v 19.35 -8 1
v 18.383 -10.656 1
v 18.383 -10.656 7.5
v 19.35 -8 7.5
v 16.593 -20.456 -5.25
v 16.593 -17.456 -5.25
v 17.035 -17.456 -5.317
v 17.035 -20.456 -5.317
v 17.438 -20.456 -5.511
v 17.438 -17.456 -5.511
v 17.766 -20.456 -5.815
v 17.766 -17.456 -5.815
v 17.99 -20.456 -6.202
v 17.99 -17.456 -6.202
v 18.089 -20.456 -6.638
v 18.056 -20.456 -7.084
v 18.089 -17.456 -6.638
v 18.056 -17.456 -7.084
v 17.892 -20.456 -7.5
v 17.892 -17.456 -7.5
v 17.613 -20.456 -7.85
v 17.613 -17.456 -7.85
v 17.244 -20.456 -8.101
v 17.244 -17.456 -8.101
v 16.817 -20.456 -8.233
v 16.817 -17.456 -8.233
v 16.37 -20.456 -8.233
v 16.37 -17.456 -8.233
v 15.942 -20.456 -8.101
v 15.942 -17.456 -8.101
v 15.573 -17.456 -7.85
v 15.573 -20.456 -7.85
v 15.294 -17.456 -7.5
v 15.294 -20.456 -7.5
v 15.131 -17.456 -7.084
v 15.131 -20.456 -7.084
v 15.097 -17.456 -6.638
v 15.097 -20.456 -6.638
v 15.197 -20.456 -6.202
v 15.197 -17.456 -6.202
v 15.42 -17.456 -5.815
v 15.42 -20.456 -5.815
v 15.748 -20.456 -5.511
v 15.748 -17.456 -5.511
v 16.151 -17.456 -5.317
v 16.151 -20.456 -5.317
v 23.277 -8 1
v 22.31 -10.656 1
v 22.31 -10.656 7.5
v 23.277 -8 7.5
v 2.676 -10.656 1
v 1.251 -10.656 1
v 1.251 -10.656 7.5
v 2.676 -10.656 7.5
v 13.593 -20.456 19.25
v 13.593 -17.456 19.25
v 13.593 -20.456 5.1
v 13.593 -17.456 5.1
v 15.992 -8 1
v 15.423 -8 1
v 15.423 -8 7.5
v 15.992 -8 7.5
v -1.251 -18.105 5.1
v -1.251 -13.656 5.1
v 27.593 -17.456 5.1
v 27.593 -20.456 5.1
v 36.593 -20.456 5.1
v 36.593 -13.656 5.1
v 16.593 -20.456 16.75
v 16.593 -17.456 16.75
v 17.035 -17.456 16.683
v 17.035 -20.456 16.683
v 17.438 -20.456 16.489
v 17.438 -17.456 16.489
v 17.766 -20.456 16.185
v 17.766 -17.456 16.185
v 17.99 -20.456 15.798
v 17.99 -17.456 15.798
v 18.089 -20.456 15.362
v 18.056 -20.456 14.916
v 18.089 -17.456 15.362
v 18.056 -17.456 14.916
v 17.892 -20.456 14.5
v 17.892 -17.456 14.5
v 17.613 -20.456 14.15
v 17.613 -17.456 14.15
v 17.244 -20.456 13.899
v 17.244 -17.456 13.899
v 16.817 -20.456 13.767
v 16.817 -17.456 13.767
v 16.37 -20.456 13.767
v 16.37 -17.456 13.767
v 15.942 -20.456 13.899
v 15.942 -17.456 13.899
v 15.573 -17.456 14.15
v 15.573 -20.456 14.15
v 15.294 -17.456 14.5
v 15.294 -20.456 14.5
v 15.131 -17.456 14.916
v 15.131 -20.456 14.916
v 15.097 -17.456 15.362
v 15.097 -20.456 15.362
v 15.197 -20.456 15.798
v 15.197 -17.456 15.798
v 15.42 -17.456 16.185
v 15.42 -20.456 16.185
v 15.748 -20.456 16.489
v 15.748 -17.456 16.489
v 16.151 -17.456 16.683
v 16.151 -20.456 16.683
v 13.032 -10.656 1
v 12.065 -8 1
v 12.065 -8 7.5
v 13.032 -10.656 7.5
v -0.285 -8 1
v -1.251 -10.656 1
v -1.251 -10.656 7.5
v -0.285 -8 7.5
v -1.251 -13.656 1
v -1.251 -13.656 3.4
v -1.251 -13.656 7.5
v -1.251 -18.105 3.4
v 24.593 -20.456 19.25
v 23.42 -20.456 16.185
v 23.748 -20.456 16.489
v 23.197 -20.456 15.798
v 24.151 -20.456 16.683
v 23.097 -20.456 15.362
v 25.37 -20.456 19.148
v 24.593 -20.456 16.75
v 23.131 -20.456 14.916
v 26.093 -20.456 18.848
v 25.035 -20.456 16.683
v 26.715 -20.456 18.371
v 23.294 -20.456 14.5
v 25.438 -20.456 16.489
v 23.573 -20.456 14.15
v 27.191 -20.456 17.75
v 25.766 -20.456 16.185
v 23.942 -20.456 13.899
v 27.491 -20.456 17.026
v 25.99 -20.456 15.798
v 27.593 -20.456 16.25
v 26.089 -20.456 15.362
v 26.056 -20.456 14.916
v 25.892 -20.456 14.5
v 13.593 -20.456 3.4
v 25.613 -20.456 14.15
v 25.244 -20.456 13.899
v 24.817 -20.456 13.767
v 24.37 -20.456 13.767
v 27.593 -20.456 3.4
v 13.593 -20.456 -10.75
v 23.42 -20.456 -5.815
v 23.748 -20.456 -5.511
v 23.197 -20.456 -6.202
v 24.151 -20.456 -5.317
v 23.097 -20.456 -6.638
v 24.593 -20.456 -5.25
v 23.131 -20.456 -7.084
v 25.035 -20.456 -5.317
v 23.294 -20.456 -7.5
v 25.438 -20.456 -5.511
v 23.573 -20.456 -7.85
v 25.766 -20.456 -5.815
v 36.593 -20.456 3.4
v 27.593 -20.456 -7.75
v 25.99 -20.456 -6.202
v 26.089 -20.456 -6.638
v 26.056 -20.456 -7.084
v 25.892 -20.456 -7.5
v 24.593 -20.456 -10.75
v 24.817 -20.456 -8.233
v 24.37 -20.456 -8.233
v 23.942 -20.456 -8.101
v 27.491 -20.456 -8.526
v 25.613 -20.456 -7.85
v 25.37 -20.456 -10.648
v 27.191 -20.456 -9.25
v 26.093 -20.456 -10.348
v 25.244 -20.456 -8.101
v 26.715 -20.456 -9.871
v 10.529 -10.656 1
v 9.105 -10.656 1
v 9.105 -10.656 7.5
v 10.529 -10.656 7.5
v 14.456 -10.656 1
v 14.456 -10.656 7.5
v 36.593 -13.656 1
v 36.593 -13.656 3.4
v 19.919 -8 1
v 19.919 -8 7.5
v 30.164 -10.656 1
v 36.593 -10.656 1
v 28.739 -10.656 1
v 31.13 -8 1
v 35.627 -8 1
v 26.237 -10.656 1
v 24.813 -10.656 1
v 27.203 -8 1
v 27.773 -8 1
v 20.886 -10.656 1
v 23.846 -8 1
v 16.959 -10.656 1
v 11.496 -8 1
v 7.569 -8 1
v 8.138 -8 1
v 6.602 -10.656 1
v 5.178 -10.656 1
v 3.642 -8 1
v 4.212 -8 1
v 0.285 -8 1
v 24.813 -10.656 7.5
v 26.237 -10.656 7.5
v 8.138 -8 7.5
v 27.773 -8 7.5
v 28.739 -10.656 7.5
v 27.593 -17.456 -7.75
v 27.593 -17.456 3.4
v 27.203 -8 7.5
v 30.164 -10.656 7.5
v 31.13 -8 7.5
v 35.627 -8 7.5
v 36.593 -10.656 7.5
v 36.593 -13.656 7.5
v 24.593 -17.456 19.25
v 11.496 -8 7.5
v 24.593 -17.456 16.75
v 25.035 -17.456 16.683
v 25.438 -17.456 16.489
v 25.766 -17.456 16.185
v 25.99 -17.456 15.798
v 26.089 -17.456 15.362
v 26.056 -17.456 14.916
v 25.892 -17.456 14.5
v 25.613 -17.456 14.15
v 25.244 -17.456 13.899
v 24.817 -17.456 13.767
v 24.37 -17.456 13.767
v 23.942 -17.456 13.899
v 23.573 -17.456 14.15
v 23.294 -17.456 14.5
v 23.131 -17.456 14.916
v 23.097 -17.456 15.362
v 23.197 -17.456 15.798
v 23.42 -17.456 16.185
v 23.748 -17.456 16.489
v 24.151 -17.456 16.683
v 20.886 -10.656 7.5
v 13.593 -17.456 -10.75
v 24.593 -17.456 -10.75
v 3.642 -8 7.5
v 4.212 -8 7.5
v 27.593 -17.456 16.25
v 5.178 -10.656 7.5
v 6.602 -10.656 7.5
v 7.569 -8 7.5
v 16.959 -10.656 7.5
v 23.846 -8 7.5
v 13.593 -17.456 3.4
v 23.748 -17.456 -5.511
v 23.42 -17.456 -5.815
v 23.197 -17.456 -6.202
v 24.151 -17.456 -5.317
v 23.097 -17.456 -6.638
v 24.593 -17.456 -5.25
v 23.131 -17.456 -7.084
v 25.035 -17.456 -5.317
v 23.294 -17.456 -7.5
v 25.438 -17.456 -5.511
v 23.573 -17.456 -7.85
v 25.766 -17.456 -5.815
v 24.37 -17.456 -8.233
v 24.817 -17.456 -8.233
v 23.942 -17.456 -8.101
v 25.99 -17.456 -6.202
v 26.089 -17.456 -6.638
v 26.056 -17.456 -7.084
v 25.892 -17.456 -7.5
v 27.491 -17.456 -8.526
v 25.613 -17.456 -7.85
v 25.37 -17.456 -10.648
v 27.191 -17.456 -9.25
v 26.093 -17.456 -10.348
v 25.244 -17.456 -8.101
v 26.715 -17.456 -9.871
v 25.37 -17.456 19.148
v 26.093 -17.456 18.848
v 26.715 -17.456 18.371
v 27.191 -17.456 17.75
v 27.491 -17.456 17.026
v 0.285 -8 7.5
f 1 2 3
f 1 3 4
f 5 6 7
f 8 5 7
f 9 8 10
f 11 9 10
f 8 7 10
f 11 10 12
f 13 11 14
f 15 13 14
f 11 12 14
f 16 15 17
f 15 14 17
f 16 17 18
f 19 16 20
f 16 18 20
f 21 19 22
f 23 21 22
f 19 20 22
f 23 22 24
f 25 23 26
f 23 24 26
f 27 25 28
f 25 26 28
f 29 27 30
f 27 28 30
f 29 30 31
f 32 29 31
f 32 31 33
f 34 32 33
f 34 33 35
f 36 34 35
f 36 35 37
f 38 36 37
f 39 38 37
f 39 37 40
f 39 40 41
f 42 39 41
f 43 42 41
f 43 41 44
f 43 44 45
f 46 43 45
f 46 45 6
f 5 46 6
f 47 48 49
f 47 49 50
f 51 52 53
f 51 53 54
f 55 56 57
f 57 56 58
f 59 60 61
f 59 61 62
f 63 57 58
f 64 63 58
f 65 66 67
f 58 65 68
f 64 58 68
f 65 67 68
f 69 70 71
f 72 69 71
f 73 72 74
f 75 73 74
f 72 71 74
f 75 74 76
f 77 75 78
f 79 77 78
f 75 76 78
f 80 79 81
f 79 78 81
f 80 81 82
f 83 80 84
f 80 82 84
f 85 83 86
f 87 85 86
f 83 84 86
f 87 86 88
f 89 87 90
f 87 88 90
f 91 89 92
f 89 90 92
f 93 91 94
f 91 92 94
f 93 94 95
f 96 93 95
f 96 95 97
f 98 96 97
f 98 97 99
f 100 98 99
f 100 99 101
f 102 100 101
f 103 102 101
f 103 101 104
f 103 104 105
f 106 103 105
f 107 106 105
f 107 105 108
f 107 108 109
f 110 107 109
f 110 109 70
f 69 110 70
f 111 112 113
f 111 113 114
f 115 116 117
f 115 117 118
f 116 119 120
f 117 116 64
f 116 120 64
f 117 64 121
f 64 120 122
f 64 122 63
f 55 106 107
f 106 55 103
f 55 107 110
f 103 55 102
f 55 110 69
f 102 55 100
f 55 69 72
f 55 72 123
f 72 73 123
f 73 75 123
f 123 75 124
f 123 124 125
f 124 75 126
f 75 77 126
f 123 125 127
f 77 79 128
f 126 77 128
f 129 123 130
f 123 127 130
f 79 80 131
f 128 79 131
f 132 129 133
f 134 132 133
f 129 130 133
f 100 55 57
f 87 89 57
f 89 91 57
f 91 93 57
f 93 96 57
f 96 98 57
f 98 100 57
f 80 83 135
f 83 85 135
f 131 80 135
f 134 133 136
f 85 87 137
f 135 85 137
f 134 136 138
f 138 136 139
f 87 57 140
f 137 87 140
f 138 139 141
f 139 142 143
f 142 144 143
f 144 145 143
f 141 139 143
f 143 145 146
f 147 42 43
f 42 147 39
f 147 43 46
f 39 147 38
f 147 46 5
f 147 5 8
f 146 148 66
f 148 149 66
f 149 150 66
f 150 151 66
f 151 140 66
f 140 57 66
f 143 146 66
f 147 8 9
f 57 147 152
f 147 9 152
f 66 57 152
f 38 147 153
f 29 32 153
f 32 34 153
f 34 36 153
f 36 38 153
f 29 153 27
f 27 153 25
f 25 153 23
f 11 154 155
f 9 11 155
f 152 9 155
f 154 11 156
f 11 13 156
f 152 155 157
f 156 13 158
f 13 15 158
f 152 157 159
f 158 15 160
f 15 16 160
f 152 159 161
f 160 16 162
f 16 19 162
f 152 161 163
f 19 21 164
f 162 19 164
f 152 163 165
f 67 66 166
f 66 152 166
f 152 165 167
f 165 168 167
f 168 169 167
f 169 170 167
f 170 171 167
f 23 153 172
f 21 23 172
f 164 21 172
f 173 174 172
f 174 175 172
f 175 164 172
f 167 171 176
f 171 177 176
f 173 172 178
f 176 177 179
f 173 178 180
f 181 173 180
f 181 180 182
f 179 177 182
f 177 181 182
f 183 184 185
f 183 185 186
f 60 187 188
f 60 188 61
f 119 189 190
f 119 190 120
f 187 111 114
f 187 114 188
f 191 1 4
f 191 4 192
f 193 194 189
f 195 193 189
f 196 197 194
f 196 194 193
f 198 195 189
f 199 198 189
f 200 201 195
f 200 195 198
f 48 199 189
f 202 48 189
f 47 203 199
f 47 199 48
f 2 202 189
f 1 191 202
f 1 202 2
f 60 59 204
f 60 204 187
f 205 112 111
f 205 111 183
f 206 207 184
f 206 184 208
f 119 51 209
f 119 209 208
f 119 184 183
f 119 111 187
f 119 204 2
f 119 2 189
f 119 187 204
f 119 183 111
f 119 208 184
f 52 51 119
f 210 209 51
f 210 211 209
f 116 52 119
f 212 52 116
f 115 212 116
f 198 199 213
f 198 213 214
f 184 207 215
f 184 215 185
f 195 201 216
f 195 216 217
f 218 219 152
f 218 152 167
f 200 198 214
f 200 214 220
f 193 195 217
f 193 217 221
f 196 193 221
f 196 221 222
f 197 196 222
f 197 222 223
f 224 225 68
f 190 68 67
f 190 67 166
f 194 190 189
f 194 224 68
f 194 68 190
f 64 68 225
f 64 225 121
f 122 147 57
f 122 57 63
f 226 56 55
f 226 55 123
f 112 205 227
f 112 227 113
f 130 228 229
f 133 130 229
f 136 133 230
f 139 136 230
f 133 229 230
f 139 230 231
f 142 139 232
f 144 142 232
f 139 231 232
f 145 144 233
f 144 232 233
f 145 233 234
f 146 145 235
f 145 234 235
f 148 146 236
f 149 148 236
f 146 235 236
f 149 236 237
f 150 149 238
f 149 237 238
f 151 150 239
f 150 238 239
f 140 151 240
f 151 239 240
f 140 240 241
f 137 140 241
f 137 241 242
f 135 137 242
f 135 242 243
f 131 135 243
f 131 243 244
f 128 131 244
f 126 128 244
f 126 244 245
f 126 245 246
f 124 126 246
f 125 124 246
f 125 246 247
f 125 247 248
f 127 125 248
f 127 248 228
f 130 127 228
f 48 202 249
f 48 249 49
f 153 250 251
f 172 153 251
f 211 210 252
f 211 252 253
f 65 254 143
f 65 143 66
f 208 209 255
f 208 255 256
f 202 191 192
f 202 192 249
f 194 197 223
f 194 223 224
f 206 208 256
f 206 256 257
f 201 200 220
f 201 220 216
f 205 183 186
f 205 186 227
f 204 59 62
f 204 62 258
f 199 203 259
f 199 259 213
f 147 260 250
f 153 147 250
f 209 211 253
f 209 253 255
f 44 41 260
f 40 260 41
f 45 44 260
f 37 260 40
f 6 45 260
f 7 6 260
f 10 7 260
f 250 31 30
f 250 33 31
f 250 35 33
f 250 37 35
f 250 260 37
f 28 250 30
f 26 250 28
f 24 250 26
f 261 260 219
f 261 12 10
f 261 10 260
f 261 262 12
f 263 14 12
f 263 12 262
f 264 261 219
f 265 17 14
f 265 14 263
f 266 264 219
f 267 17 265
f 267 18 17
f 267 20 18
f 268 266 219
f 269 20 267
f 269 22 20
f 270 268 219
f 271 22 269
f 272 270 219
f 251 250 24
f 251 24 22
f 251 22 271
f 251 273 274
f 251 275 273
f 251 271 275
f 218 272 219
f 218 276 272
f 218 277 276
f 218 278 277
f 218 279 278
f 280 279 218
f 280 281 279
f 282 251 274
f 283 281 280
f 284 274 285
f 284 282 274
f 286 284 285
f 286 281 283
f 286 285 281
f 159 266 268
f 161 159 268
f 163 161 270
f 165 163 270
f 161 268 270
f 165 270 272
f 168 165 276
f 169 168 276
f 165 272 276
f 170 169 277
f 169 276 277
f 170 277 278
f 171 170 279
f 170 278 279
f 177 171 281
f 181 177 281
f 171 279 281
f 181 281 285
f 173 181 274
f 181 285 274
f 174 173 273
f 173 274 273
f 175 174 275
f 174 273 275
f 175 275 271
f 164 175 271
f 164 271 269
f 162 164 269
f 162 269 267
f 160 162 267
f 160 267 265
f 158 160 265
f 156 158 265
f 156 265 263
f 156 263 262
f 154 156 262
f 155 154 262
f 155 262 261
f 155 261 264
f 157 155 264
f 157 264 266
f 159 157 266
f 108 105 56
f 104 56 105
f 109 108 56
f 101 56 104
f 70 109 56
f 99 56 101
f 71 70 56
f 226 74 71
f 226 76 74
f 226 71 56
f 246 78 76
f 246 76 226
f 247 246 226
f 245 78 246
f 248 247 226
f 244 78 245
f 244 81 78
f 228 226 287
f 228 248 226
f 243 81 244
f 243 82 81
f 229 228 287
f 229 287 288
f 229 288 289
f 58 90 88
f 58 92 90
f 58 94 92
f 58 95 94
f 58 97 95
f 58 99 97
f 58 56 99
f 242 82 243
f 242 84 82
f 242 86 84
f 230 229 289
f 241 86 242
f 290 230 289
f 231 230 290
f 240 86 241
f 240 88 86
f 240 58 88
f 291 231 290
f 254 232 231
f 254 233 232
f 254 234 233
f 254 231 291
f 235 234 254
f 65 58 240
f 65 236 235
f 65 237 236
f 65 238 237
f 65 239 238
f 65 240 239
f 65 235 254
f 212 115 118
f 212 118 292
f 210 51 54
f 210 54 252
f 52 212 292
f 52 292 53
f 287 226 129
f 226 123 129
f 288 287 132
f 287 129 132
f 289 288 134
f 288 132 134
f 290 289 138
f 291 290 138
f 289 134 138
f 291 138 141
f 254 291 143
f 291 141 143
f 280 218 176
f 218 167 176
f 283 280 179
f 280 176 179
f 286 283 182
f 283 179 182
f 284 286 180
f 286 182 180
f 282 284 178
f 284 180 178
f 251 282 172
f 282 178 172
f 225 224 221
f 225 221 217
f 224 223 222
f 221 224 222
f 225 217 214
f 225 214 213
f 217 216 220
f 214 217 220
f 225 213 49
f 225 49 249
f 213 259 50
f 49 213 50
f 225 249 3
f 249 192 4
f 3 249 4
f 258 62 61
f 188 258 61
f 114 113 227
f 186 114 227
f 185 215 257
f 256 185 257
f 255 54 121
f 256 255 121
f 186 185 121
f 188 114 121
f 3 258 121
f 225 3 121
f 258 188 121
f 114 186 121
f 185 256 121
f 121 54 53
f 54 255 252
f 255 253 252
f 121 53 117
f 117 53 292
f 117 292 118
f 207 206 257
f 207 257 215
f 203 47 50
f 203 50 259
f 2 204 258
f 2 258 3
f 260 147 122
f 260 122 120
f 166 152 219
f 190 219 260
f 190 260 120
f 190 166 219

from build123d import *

# Parameters (mm, degrees)
ESQUISSE1_R             = 2.5
BOSS_EXTRU_1_DEPTH      = 1
BOSS_EXTRU_2_DEPTH      = 6.5
ESQUISSE3_R             = 14.137419556
ENL_V_MAT_EXTRU_1_DEPTH = 1
ESQUISSE4_W             = 37.844594902
ESQUISSE4_H             = 1.7
BOSS_EXTRU_3_DEPTH      = 3.8
BOSS_EXTRU_4_START      = -17.456
ESQUISSE5_W             = 20
ESQUISSE5_H             = 30
BOSS_EXTRU_4_DEPTH      = 3
BOSS_EXTRU_5_START      = -17.456
ESQUISSE7_W             = 3
ESQUISSE7_H             = 30
BOSS_EXTRU_5_DEPTH      = 3
CHANFREIN1_SIZE         = 3
CHANFREIN1_SIZE_2       = 18.941254544
ESQUISSE6_R             = 1.5
ENL_V_MAT_EXTRU_2_DEPTH = 47.131066324
BOSS_EXTRU_6_START      = 1
BOSS_EXTRU_6_DEPTH      = 6.5
ESQUISSE9_W             = 9
ESQUISSE9_H             = 14.15
ENL_V_MAT_EXTRU_3_DEPTH = 43.415130321
CONG_2_R                = 3


with BuildPart() as part:
    # Esquisse1 → Boss.-Extru.1 (new body)
    with BuildSketch(Plane.XY):
        with BuildLine():
            ThreePointArc((-2.797532396, 7.349311298), (-3.009326841, 7.265157674), (-3.218593728, 7.174901984))
            ThreePointArc((-3.218593728, 7.174901984), (-3.518823735, 7.161602241), (-3.746621491, 7.357620412))
            ThreePointArc((-3.746621491, 7.357620412), (-4.480939546, 8.300763177), (-5.498824516, 8.927382256))
            ThreePointArc((-5.498824516, 8.927382256), (-5.825153893, 8.717958885), (-6.143516706, 8.496612707))
            ThreePointArc((-6.143516706, 8.496612707), (-5.954123878, 7.316412877), (-5.363784935, 6.277066345))
            ThreePointArc((-5.363784935, 6.277066345), (-5.269862186, 5.991595754), (-5.397042596, 5.719308987))
            ThreePointArc((-5.397042596, 5.719308987), (-5.560510951, 5.560510951), (-5.719308987, 5.397042596))
            ThreePointArc((-5.719308987, 5.397042596), (-5.991595754, 5.269862186), (-6.277066345, 5.363784935))
            ThreePointArc((-6.277066345, 5.363784935), (-7.316412877, 5.954123878), (-8.496612707, 6.143516706))
            ThreePointArc((-8.496612707, 6.143516706), (-8.717958885, 5.825153893), (-8.927382256, 5.498824516))
            ThreePointArc((-8.927382256, 5.498824516), (-8.300763177, 4.480939546), (-7.357620412, 3.746621491))
            ThreePointArc((-7.357620412, 3.746621491), (-7.161602241, 3.518823735), (-7.174901984, 3.218593728))
            ThreePointArc((-7.174901984, 3.218593728), (-7.265157674, 3.009326841), (-7.349311298, 2.797532396))
            ThreePointArc((-7.349311298, 2.797532396), (-7.552201634, 2.575833384), (-7.851884749, 2.553361824))
            ThreePointArc((-7.851884749, 2.553361824), (-9.038028671, 2.701023192), (-10.200868635, 2.424356428))
            ThreePointArc((-10.200868635, 2.424356428), (-10.283533665, 2.045522026), (-10.352134785, 1.663890139))
            ThreePointArc((-10.352134785, 1.663890139), (-9.383686529, 0.963283789), (-8.231324879, 0.645787478))
            ThreePointArc((-8.231324879, 0.645787478), (-7.963053276, 0.510342701), (-7.860447586, 0.22787675))
            ThreePointArc((-7.860447586, 0.22787675), (-7.86375, 0), (-7.860447586, -0.22787675))
            ThreePointArc((-7.860447586, -0.22787675), (-7.963053276, -0.510342701), (-8.231324879, -0.645787478))
            ThreePointArc((-8.231324879, -0.645787478), (-9.383686529, -0.963283789), (-10.352134785, -1.663890139))
            ThreePointArc((-10.352134785, -1.663890139), (-10.283533665, -2.045522026), (-10.200868635, -2.424356428))
            ThreePointArc((-10.200868635, -2.424356428), (-9.038028671, -2.701023192), (-7.851884749, -2.553361824))
            ThreePointArc((-7.851884749, -2.553361824), (-7.552201634, -2.575833384), (-7.349311298, -2.797532396))
            ThreePointArc((-7.349311298, -2.797532396), (-7.265157674, -3.009326841), (-7.174901984, -3.218593728))
            ThreePointArc((-7.174901984, -3.218593728), (-7.161602241, -3.518823735), (-7.357620412, -3.746621491))
            ThreePointArc((-7.357620412, -3.746621491), (-8.300763177, -4.480939546), (-8.927382256, -5.498824516))
            ThreePointArc((-8.927382256, -5.498824516), (-8.717958885, -5.825153893), (-8.496612707, -6.143516706))
            ThreePointArc((-8.496612707, -6.143516706), (-7.316412877, -5.954123878), (-6.277066345, -5.363784935))
            ThreePointArc((-6.277066345, -5.363784935), (-5.991595754, -5.269862186), (-5.719308987, -5.397042596))
            ThreePointArc((-5.719308987, -5.397042596), (-5.560510951, -5.560510951), (-5.397042596, -5.719308987))
            ThreePointArc((-5.397042596, -5.719308987), (-5.269862186, -5.991595754), (-5.363784935, -6.277066345))
            ThreePointArc((-5.363784935, -6.277066345), (-5.954123878, -7.316412877), (-6.143516706, -8.496612707))
            ThreePointArc((-6.143516706, -8.496612707), (-5.825153893, -8.717958885), (-5.498824516, -8.927382256))
            ThreePointArc((-5.498824516, -8.927382256), (-4.480939546, -8.300763177), (-3.746621491, -7.357620412))
            ThreePointArc((-3.746621491, -7.357620412), (-3.518823735, -7.161602241), (-3.218593728, -7.174901984))
            ThreePointArc((-3.218593728, -7.174901984), (-3.009326841, -7.265157674), (-2.797532396, -7.349311298))
            ThreePointArc((-2.797532396, -7.349311298), (-2.575833384, -7.552201634), (-2.553361824, -7.851884749))
            ThreePointArc((-2.553361824, -7.851884749), (-2.701023192, -9.038028671), (-2.424356428, -10.200868635))
            ThreePointArc((-2.424356428, -10.200868635), (-2.045522026, -10.283533665), (-1.663890139, -10.352134785))
            ThreePointArc((-1.663890139, -10.352134785), (-0.963283789, -9.383686529), (-0.645787478, -8.231324879))
            ThreePointArc((-0.645787478, -8.231324879), (-0.510342701, -7.963053276), (-0.22787675, -7.860447586))
            ThreePointArc((-0.22787675, -7.860447586), (0, -7.86375), (0.22787675, -7.860447586))
            ThreePointArc((0.22787675, -7.860447586), (0.510342701, -7.963053276), (0.645787478, -8.231324879))
            ThreePointArc((0.645787478, -8.231324879), (0.963283789, -9.383686529), (1.663890139, -10.352134785))
            ThreePointArc((1.663890139, -10.352134785), (2.045522026, -10.283533665), (2.424356428, -10.200868635))
            ThreePointArc((2.424356428, -10.200868635), (2.701023192, -9.038028671), (2.553361824, -7.851884749))
            ThreePointArc((2.553361824, -7.851884749), (2.575833384, -7.552201634), (2.797532396, -7.349311298))
            ThreePointArc((2.797532396, -7.349311298), (3.009326841, -7.265157674), (3.218593728, -7.174901984))
            ThreePointArc((3.218593728, -7.174901984), (3.518823735, -7.161602241), (3.746621491, -7.357620412))
            ThreePointArc((3.746621491, -7.357620412), (4.480939546, -8.300763177), (5.498824516, -8.927382256))
            ThreePointArc((5.498824516, -8.927382256), (5.825153893, -8.717958885), (6.143516706, -8.496612707))
            ThreePointArc((6.143516706, -8.496612707), (5.954123878, -7.316412877), (5.363784935, -6.277066345))
            ThreePointArc((5.363784935, -6.277066345), (5.269862186, -5.991595754), (5.397042596, -5.719308987))
            ThreePointArc((5.397042596, -5.719308987), (5.560510951, -5.560510951), (5.719308987, -5.397042596))
            ThreePointArc((5.719308987, -5.397042596), (5.991595754, -5.269862186), (6.277066345, -5.363784935))
            ThreePointArc((6.277066345, -5.363784935), (7.316412877, -5.954123878), (8.496612707, -6.143516706))
            ThreePointArc((8.496612707, -6.143516706), (8.717958885, -5.825153893), (8.927382256, -5.498824516))
            ThreePointArc((8.927382256, -5.498824516), (8.300763177, -4.480939546), (7.357620412, -3.746621491))
            ThreePointArc((7.357620412, -3.746621491), (7.161602241, -3.518823735), (7.174901984, -3.218593728))
            ThreePointArc((7.174901984, -3.218593728), (7.265157674, -3.009326841), (7.349311298, -2.797532396))
            ThreePointArc((7.349311298, -2.797532396), (7.552201634, -2.575833384), (7.851884749, -2.553361824))
            ThreePointArc((7.851884749, -2.553361824), (9.038028671, -2.701023192), (10.200868635, -2.424356428))
            ThreePointArc((10.200868635, -2.424356428), (10.283533665, -2.045522026), (10.352134785, -1.663890139))
            ThreePointArc((10.352134785, -1.663890139), (9.383686529, -0.963283789), (8.231324879, -0.645787478))
            ThreePointArc((8.231324879, -0.645787478), (7.963053276, -0.510342701), (7.860447586, -0.22787675))
            ThreePointArc((7.860447586, -0.22787675), (7.86375, 0), (7.860447586, 0.22787675))
            ThreePointArc((7.860447586, 0.22787675), (7.963053276, 0.510342701), (8.231324879, 0.645787478))
            ThreePointArc((8.231324879, 0.645787478), (9.383686529, 0.963283789), (10.352134785, 1.663890139))
            ThreePointArc((10.352134785, 1.663890139), (10.283533665, 2.045522026), (10.200868635, 2.424356428))
            ThreePointArc((10.200868635, 2.424356428), (9.038028671, 2.701023192), (7.851884749, 2.553361824))
            ThreePointArc((7.851884749, 2.553361824), (7.552201634, 2.575833384), (7.349311298, 2.797532396))
            ThreePointArc((7.349311298, 2.797532396), (7.265157674, 3.009326841), (7.174901984, 3.218593728))
            ThreePointArc((7.174901984, 3.218593728), (7.161602241, 3.518823735), (7.357620412, 3.746621491))
            ThreePointArc((7.357620412, 3.746621491), (8.300763177, 4.480939546), (8.927382256, 5.498824516))
            ThreePointArc((8.927382256, 5.498824516), (8.717958885, 5.825153893), (8.496612707, 6.143516706))
            ThreePointArc((8.496612707, 6.143516706), (7.316412877, 5.954123878), (6.277066345, 5.363784935))
            ThreePointArc((6.277066345, 5.363784935), (5.991595754, 5.269862186), (5.719308987, 5.397042596))
            ThreePointArc((5.719308987, 5.397042596), (5.560510951, 5.560510951), (5.397042596, 5.719308987))
            ThreePointArc((5.397042596, 5.719308987), (5.269862186, 5.991595754), (5.363784935, 6.277066345))
            ThreePointArc((5.363784935, 6.277066345), (5.954123878, 7.316412877), (6.143516706, 8.496612707))
            ThreePointArc((6.143516706, 8.496612707), (5.825153893, 8.717958885), (5.498824516, 8.927382256))
            ThreePointArc((5.498824516, 8.927382256), (4.480939546, 8.300763177), (3.746621491, 7.357620412))
            ThreePointArc((3.746621491, 7.357620412), (3.518823735, 7.161602241), (3.218593728, 7.174901984))
            ThreePointArc((3.218593728, 7.174901984), (3.009326841, 7.265157674), (2.797532396, 7.349311298))
            ThreePointArc((2.797532396, 7.349311298), (2.575833384, 7.552201634), (2.553361824, 7.851884749))
            ThreePointArc((2.553361824, 7.851884749), (2.701023192, 9.038028671), (2.424356428, 10.200868635))
            ThreePointArc((2.424356428, 10.200868635), (2.045522026, 10.283533665), (1.663890139, 10.352134785))
            ThreePointArc((1.663890139, 10.352134785), (0.963283789, 9.383686529), (0.645787478, 8.231324879))
            ThreePointArc((0.645787478, 8.231324879), (0.510342701, 7.963053276), (0.22787675, 7.860447586))
            ThreePointArc((0.22787675, 7.860447586), (0, 7.86375), (-0.22787675, 7.860447586))
            ThreePointArc((-0.22787675, 7.860447586), (-0.510342701, 7.963053276), (-0.645787478, 8.231324879))
            ThreePointArc((-0.645787478, 8.231324879), (-0.963283789, 9.383686529), (-1.663890139, 10.352134785))
            ThreePointArc((-1.663890139, 10.352134785), (-2.045522026, 10.283533665), (-2.424356428, 10.200868635))
            ThreePointArc((-2.424356428, 10.200868635), (-2.701023192, 9.038028671), (-2.553361824, 7.851884749))
            ThreePointArc((-2.553361824, 7.851884749), (-2.575833384, 7.552201634), (-2.797532396, 7.349311298))
        make_face()
        Circle(ESQUISSE1_R, mode=Mode.SUBTRACT)
    extrude(amount=BOSS_EXTRU_1_DEPTH)

    # Esquisse2 → Boss.-Extru.2 (add)
    with BuildSketch(Plane.XY.offset(1)):
        Polygon((0.284655009, -8), (1.251359951, -10.656), (2.675515049, -10.656), (3.642219991, -8), (4.211530009, -8), (5.178234951, -10.656), (6.602390049, -10.656), (7.569094991, -8), (8.138405009, -8), (9.105109951, -10.656), (10.529265049, -10.656), (11.495969991, -8), (12.065280009, -8), (13.031984951, -10.656), (14.456140049, -10.656), (15.422844991, -8), (15.992155009, -8), (16.958859951, -10.656), (18.383015049, -10.656), (19.349719991, -8), (19.919030009, -8), (20.885734951, -10.656), (22.309890049, -10.656), (23.276594991, -8), (23.845905009, -8), (24.812609951, -10.656), (26.236765049, -10.656), (27.203469991, -8), (27.772780009, -8), (28.739484951, -10.656), (30.163640049, -10.656), (31.130344991, -8), (31.699655009, -8), (32.666359951, -10.656), (34.090515049, -10.656), (35.057219991, -8), (35.626530009, -8), (36.593234951, -10.656), (36.593234951, -13.656), (-1.251359951, -13.656), (-1.251359951, -10.656), (-0.284655009, -8), align=None)
    extrude(amount=BOSS_EXTRU_2_DEPTH)

    # Esquisse3 → Enlèv. mat.-Extru.1 (cut)
    with BuildSketch(Plane(origin=(0, 0, 0), x_dir=(-1, 0, 0), z_dir=(0, 0, -1))):
        Circle(ESQUISSE3_R)
    extrude(amount=-ENL_V_MAT_EXTRU_1_DEPTH, mode=Mode.SUBTRACT)

    # Esquisse4 → Boss.-Extru.3 (add)
    with BuildSketch(Plane.XZ.offset(13.656)):
        with Locations((17.6709375, 4.25)):
            Rectangle(ESQUISSE4_W, ESQUISSE4_H)
    extrude(amount=BOSS_EXTRU_3_DEPTH)

    # Esquisse5 → Boss.-Extru.4 (add)
    with BuildSketch(Plane(origin=(0, 0, 0), x_dir=(1, 0, 0), z_dir=(0, 1, 0)).offset(BOSS_EXTRU_4_START)):
        with Locations((26.593234951, -4.25)):
            Rectangle(ESQUISSE5_W, ESQUISSE5_H)
    extrude(amount=-BOSS_EXTRU_4_DEPTH)

    # Esquisse7 → Boss.-Extru.5 (add)
    with BuildSketch(Plane(origin=(0, 0, 0), x_dir=(1, 0, 0), z_dir=(0, 1, 0)).offset(BOSS_EXTRU_5_START)):
        with Locations((15.093234951, -4.25)):
            Rectangle(ESQUISSE7_W, ESQUISSE7_H)
    extrude(amount=-BOSS_EXTRU_5_DEPTH)

    # Chanfrein1
    # the kernel refuses this chamfer: 18.941254544, 3 mm, written as the material it adds along each edge
    with BuildSketch(Plane(origin=(13.593234951, -17.456, 3.4), x_dir=(0.23333663699196244, -0.9723960169793381, 0), z_dir=(0, 0, 1))) as chanfrein1_piece_1_section:
        Polygon((CHANFREIN1_SIZE * 0.972396016979, -CHANFREIN1_SIZE * 0.233336636992), (-CHANFREIN1_SIZE_2 * 0.233336636992, -CHANFREIN1_SIZE_2 * 0.972396016981), (0, 0), align=None)
    chanfrein1_piece_1 = extrude(amount=1.7, mode=Mode.PRIVATE)
    chanfrein1_piece_1 = split(chanfrein1_piece_1, bisect_by=Plane(origin=(-1.251359951, -18.494459875, 4.25), z_dir=(1, 0, 0)), keep=Keep.TOP, mode=Mode.PRIVATE)
    add(chanfrein1_piece_1)

    # Esquisse6 → Enlèv. mat.-Extru.2 (cut, through all)
    with BuildSketch(Plane(origin=(0, 0, 0), x_dir=(1, 0, 0), z_dir=(0, 1, 0))):
        with Locations(Location((16.593234951, 6.75, 0), (0, 0, 270))):
            Circle(ESQUISSE6_R)
        with Locations(Location((24.593234951, 6.75, 0), (0, 0, 270))):
            Circle(ESQUISSE6_R)
        with Locations(Location((24.593234951, -15.25, 0), (0, 0, 270))):
            Circle(ESQUISSE6_R)
        with Locations(Location((16.593234951, -15.25, 0), (0, 0, 270))):
            Circle(ESQUISSE6_R)
    extrude(amount=-ENL_V_MAT_EXTRU_2_DEPTH, mode=Mode.SUBTRACT)

    # Esquisse8 → Boss.-Extru.6 (add)
    with BuildSketch(Plane.XY.offset(BOSS_EXTRU_6_START)):
        Polygon((31.699655009, -8), (35.057219991, -8), (34.090515049, -10.656), (32.666359951, -10.656), align=None)
    extrude(amount=BOSS_EXTRU_6_DEPTH)

    # Esquisse9 → Enlèv. mat.-Extru.3 (cut, through all)
    with BuildSketch(Plane(origin=(0, -17.456, 0), x_dir=(1, 0, 0), z_dir=(0, 1, 0))):
        with Locations((32.093234951, 3.675)):
            Rectangle(ESQUISSE9_W, ESQUISSE9_H)
        with Locations((32.093234951, -12.175)):
            Rectangle(ESQUISSE9_W, ESQUISSE9_H)
    extrude(amount=-ENL_V_MAT_EXTRU_3_DEPTH, mode=Mode.SUBTRACT)

    # Congé2
    cong_2_edges = [part.edges().sort_by_distance(p)[0] for p in [
        (27.593234951, -18.956, -10.75),
        (27.593234951, -18.956, 19.25),
    ]]
    fillet(cong_2_edges, radius=CONG_2_R)


solid = part.part
